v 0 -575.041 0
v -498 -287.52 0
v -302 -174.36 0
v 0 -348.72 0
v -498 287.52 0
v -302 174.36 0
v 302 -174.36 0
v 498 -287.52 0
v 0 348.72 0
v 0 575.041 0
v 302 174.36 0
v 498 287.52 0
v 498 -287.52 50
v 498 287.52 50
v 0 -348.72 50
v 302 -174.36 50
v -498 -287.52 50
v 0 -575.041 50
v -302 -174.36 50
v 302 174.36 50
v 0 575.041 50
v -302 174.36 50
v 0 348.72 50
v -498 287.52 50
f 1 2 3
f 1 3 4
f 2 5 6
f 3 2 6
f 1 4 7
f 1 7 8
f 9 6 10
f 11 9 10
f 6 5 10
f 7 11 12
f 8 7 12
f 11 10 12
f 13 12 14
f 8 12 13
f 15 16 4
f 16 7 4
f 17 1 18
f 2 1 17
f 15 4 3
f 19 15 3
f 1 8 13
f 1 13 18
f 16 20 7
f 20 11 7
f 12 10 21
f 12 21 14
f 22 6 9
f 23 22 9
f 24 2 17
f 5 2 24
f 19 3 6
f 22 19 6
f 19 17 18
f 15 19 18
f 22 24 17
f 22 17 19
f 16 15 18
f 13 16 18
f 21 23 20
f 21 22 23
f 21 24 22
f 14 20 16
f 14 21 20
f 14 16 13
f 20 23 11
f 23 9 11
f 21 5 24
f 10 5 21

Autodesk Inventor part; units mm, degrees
ref_plane "YZ Plane" through (0, 0, 0) normal (1, 0, 0) x (0, 1, 0)
ref_plane "XZ Plane" through (0, 0, 0) normal (0, 1, 0) x (-1, 0, 0)
ref_plane "Work Plane1" through (0, 0, 0) normal (0, 0, 1) x (1, 0, 0)
sketch "Sketch1" plane through (0, 0, 0) normal (0, 0, 1) x (1, 0, 0)
  line L0 (302, -174.3598) -> (0, -348.7196)
  line L1 (0, -348.7196) -> (-302, -174.3598)
  line L2 (-302, -174.3598) -> (-302, 174.3598)
  line L3 (-302, 174.3598) -> (0, 348.7196)
  line L4 (0, 348.7196) -> (302, 174.3598)
  line L5 (302, 174.3598) -> (302, -174.3598)
  line L6 (498, -287.5204) -> (0, -575.0409)
  line L7 (0, -575.0409) -> (-498, -287.5204)
  line L8 (-498, -287.5204) -> (-498, 287.5204)
  line L9 (-498, 287.5204) -> (0, 575.0409)
  line L10 (0, 575.0409) -> (498, 287.5204)
  line L11 (498, 287.5204) -> (498, -287.5204)
  point P0 (0, 0)
  point P1 (0, 0)
  point P2 (0, 0)
  dimension "d0" = 302
  dimension "d1" = 498
extrude "Extrusion1" add sketch "Sketch1" along normal blind 50
properties part number "Sustrat"
